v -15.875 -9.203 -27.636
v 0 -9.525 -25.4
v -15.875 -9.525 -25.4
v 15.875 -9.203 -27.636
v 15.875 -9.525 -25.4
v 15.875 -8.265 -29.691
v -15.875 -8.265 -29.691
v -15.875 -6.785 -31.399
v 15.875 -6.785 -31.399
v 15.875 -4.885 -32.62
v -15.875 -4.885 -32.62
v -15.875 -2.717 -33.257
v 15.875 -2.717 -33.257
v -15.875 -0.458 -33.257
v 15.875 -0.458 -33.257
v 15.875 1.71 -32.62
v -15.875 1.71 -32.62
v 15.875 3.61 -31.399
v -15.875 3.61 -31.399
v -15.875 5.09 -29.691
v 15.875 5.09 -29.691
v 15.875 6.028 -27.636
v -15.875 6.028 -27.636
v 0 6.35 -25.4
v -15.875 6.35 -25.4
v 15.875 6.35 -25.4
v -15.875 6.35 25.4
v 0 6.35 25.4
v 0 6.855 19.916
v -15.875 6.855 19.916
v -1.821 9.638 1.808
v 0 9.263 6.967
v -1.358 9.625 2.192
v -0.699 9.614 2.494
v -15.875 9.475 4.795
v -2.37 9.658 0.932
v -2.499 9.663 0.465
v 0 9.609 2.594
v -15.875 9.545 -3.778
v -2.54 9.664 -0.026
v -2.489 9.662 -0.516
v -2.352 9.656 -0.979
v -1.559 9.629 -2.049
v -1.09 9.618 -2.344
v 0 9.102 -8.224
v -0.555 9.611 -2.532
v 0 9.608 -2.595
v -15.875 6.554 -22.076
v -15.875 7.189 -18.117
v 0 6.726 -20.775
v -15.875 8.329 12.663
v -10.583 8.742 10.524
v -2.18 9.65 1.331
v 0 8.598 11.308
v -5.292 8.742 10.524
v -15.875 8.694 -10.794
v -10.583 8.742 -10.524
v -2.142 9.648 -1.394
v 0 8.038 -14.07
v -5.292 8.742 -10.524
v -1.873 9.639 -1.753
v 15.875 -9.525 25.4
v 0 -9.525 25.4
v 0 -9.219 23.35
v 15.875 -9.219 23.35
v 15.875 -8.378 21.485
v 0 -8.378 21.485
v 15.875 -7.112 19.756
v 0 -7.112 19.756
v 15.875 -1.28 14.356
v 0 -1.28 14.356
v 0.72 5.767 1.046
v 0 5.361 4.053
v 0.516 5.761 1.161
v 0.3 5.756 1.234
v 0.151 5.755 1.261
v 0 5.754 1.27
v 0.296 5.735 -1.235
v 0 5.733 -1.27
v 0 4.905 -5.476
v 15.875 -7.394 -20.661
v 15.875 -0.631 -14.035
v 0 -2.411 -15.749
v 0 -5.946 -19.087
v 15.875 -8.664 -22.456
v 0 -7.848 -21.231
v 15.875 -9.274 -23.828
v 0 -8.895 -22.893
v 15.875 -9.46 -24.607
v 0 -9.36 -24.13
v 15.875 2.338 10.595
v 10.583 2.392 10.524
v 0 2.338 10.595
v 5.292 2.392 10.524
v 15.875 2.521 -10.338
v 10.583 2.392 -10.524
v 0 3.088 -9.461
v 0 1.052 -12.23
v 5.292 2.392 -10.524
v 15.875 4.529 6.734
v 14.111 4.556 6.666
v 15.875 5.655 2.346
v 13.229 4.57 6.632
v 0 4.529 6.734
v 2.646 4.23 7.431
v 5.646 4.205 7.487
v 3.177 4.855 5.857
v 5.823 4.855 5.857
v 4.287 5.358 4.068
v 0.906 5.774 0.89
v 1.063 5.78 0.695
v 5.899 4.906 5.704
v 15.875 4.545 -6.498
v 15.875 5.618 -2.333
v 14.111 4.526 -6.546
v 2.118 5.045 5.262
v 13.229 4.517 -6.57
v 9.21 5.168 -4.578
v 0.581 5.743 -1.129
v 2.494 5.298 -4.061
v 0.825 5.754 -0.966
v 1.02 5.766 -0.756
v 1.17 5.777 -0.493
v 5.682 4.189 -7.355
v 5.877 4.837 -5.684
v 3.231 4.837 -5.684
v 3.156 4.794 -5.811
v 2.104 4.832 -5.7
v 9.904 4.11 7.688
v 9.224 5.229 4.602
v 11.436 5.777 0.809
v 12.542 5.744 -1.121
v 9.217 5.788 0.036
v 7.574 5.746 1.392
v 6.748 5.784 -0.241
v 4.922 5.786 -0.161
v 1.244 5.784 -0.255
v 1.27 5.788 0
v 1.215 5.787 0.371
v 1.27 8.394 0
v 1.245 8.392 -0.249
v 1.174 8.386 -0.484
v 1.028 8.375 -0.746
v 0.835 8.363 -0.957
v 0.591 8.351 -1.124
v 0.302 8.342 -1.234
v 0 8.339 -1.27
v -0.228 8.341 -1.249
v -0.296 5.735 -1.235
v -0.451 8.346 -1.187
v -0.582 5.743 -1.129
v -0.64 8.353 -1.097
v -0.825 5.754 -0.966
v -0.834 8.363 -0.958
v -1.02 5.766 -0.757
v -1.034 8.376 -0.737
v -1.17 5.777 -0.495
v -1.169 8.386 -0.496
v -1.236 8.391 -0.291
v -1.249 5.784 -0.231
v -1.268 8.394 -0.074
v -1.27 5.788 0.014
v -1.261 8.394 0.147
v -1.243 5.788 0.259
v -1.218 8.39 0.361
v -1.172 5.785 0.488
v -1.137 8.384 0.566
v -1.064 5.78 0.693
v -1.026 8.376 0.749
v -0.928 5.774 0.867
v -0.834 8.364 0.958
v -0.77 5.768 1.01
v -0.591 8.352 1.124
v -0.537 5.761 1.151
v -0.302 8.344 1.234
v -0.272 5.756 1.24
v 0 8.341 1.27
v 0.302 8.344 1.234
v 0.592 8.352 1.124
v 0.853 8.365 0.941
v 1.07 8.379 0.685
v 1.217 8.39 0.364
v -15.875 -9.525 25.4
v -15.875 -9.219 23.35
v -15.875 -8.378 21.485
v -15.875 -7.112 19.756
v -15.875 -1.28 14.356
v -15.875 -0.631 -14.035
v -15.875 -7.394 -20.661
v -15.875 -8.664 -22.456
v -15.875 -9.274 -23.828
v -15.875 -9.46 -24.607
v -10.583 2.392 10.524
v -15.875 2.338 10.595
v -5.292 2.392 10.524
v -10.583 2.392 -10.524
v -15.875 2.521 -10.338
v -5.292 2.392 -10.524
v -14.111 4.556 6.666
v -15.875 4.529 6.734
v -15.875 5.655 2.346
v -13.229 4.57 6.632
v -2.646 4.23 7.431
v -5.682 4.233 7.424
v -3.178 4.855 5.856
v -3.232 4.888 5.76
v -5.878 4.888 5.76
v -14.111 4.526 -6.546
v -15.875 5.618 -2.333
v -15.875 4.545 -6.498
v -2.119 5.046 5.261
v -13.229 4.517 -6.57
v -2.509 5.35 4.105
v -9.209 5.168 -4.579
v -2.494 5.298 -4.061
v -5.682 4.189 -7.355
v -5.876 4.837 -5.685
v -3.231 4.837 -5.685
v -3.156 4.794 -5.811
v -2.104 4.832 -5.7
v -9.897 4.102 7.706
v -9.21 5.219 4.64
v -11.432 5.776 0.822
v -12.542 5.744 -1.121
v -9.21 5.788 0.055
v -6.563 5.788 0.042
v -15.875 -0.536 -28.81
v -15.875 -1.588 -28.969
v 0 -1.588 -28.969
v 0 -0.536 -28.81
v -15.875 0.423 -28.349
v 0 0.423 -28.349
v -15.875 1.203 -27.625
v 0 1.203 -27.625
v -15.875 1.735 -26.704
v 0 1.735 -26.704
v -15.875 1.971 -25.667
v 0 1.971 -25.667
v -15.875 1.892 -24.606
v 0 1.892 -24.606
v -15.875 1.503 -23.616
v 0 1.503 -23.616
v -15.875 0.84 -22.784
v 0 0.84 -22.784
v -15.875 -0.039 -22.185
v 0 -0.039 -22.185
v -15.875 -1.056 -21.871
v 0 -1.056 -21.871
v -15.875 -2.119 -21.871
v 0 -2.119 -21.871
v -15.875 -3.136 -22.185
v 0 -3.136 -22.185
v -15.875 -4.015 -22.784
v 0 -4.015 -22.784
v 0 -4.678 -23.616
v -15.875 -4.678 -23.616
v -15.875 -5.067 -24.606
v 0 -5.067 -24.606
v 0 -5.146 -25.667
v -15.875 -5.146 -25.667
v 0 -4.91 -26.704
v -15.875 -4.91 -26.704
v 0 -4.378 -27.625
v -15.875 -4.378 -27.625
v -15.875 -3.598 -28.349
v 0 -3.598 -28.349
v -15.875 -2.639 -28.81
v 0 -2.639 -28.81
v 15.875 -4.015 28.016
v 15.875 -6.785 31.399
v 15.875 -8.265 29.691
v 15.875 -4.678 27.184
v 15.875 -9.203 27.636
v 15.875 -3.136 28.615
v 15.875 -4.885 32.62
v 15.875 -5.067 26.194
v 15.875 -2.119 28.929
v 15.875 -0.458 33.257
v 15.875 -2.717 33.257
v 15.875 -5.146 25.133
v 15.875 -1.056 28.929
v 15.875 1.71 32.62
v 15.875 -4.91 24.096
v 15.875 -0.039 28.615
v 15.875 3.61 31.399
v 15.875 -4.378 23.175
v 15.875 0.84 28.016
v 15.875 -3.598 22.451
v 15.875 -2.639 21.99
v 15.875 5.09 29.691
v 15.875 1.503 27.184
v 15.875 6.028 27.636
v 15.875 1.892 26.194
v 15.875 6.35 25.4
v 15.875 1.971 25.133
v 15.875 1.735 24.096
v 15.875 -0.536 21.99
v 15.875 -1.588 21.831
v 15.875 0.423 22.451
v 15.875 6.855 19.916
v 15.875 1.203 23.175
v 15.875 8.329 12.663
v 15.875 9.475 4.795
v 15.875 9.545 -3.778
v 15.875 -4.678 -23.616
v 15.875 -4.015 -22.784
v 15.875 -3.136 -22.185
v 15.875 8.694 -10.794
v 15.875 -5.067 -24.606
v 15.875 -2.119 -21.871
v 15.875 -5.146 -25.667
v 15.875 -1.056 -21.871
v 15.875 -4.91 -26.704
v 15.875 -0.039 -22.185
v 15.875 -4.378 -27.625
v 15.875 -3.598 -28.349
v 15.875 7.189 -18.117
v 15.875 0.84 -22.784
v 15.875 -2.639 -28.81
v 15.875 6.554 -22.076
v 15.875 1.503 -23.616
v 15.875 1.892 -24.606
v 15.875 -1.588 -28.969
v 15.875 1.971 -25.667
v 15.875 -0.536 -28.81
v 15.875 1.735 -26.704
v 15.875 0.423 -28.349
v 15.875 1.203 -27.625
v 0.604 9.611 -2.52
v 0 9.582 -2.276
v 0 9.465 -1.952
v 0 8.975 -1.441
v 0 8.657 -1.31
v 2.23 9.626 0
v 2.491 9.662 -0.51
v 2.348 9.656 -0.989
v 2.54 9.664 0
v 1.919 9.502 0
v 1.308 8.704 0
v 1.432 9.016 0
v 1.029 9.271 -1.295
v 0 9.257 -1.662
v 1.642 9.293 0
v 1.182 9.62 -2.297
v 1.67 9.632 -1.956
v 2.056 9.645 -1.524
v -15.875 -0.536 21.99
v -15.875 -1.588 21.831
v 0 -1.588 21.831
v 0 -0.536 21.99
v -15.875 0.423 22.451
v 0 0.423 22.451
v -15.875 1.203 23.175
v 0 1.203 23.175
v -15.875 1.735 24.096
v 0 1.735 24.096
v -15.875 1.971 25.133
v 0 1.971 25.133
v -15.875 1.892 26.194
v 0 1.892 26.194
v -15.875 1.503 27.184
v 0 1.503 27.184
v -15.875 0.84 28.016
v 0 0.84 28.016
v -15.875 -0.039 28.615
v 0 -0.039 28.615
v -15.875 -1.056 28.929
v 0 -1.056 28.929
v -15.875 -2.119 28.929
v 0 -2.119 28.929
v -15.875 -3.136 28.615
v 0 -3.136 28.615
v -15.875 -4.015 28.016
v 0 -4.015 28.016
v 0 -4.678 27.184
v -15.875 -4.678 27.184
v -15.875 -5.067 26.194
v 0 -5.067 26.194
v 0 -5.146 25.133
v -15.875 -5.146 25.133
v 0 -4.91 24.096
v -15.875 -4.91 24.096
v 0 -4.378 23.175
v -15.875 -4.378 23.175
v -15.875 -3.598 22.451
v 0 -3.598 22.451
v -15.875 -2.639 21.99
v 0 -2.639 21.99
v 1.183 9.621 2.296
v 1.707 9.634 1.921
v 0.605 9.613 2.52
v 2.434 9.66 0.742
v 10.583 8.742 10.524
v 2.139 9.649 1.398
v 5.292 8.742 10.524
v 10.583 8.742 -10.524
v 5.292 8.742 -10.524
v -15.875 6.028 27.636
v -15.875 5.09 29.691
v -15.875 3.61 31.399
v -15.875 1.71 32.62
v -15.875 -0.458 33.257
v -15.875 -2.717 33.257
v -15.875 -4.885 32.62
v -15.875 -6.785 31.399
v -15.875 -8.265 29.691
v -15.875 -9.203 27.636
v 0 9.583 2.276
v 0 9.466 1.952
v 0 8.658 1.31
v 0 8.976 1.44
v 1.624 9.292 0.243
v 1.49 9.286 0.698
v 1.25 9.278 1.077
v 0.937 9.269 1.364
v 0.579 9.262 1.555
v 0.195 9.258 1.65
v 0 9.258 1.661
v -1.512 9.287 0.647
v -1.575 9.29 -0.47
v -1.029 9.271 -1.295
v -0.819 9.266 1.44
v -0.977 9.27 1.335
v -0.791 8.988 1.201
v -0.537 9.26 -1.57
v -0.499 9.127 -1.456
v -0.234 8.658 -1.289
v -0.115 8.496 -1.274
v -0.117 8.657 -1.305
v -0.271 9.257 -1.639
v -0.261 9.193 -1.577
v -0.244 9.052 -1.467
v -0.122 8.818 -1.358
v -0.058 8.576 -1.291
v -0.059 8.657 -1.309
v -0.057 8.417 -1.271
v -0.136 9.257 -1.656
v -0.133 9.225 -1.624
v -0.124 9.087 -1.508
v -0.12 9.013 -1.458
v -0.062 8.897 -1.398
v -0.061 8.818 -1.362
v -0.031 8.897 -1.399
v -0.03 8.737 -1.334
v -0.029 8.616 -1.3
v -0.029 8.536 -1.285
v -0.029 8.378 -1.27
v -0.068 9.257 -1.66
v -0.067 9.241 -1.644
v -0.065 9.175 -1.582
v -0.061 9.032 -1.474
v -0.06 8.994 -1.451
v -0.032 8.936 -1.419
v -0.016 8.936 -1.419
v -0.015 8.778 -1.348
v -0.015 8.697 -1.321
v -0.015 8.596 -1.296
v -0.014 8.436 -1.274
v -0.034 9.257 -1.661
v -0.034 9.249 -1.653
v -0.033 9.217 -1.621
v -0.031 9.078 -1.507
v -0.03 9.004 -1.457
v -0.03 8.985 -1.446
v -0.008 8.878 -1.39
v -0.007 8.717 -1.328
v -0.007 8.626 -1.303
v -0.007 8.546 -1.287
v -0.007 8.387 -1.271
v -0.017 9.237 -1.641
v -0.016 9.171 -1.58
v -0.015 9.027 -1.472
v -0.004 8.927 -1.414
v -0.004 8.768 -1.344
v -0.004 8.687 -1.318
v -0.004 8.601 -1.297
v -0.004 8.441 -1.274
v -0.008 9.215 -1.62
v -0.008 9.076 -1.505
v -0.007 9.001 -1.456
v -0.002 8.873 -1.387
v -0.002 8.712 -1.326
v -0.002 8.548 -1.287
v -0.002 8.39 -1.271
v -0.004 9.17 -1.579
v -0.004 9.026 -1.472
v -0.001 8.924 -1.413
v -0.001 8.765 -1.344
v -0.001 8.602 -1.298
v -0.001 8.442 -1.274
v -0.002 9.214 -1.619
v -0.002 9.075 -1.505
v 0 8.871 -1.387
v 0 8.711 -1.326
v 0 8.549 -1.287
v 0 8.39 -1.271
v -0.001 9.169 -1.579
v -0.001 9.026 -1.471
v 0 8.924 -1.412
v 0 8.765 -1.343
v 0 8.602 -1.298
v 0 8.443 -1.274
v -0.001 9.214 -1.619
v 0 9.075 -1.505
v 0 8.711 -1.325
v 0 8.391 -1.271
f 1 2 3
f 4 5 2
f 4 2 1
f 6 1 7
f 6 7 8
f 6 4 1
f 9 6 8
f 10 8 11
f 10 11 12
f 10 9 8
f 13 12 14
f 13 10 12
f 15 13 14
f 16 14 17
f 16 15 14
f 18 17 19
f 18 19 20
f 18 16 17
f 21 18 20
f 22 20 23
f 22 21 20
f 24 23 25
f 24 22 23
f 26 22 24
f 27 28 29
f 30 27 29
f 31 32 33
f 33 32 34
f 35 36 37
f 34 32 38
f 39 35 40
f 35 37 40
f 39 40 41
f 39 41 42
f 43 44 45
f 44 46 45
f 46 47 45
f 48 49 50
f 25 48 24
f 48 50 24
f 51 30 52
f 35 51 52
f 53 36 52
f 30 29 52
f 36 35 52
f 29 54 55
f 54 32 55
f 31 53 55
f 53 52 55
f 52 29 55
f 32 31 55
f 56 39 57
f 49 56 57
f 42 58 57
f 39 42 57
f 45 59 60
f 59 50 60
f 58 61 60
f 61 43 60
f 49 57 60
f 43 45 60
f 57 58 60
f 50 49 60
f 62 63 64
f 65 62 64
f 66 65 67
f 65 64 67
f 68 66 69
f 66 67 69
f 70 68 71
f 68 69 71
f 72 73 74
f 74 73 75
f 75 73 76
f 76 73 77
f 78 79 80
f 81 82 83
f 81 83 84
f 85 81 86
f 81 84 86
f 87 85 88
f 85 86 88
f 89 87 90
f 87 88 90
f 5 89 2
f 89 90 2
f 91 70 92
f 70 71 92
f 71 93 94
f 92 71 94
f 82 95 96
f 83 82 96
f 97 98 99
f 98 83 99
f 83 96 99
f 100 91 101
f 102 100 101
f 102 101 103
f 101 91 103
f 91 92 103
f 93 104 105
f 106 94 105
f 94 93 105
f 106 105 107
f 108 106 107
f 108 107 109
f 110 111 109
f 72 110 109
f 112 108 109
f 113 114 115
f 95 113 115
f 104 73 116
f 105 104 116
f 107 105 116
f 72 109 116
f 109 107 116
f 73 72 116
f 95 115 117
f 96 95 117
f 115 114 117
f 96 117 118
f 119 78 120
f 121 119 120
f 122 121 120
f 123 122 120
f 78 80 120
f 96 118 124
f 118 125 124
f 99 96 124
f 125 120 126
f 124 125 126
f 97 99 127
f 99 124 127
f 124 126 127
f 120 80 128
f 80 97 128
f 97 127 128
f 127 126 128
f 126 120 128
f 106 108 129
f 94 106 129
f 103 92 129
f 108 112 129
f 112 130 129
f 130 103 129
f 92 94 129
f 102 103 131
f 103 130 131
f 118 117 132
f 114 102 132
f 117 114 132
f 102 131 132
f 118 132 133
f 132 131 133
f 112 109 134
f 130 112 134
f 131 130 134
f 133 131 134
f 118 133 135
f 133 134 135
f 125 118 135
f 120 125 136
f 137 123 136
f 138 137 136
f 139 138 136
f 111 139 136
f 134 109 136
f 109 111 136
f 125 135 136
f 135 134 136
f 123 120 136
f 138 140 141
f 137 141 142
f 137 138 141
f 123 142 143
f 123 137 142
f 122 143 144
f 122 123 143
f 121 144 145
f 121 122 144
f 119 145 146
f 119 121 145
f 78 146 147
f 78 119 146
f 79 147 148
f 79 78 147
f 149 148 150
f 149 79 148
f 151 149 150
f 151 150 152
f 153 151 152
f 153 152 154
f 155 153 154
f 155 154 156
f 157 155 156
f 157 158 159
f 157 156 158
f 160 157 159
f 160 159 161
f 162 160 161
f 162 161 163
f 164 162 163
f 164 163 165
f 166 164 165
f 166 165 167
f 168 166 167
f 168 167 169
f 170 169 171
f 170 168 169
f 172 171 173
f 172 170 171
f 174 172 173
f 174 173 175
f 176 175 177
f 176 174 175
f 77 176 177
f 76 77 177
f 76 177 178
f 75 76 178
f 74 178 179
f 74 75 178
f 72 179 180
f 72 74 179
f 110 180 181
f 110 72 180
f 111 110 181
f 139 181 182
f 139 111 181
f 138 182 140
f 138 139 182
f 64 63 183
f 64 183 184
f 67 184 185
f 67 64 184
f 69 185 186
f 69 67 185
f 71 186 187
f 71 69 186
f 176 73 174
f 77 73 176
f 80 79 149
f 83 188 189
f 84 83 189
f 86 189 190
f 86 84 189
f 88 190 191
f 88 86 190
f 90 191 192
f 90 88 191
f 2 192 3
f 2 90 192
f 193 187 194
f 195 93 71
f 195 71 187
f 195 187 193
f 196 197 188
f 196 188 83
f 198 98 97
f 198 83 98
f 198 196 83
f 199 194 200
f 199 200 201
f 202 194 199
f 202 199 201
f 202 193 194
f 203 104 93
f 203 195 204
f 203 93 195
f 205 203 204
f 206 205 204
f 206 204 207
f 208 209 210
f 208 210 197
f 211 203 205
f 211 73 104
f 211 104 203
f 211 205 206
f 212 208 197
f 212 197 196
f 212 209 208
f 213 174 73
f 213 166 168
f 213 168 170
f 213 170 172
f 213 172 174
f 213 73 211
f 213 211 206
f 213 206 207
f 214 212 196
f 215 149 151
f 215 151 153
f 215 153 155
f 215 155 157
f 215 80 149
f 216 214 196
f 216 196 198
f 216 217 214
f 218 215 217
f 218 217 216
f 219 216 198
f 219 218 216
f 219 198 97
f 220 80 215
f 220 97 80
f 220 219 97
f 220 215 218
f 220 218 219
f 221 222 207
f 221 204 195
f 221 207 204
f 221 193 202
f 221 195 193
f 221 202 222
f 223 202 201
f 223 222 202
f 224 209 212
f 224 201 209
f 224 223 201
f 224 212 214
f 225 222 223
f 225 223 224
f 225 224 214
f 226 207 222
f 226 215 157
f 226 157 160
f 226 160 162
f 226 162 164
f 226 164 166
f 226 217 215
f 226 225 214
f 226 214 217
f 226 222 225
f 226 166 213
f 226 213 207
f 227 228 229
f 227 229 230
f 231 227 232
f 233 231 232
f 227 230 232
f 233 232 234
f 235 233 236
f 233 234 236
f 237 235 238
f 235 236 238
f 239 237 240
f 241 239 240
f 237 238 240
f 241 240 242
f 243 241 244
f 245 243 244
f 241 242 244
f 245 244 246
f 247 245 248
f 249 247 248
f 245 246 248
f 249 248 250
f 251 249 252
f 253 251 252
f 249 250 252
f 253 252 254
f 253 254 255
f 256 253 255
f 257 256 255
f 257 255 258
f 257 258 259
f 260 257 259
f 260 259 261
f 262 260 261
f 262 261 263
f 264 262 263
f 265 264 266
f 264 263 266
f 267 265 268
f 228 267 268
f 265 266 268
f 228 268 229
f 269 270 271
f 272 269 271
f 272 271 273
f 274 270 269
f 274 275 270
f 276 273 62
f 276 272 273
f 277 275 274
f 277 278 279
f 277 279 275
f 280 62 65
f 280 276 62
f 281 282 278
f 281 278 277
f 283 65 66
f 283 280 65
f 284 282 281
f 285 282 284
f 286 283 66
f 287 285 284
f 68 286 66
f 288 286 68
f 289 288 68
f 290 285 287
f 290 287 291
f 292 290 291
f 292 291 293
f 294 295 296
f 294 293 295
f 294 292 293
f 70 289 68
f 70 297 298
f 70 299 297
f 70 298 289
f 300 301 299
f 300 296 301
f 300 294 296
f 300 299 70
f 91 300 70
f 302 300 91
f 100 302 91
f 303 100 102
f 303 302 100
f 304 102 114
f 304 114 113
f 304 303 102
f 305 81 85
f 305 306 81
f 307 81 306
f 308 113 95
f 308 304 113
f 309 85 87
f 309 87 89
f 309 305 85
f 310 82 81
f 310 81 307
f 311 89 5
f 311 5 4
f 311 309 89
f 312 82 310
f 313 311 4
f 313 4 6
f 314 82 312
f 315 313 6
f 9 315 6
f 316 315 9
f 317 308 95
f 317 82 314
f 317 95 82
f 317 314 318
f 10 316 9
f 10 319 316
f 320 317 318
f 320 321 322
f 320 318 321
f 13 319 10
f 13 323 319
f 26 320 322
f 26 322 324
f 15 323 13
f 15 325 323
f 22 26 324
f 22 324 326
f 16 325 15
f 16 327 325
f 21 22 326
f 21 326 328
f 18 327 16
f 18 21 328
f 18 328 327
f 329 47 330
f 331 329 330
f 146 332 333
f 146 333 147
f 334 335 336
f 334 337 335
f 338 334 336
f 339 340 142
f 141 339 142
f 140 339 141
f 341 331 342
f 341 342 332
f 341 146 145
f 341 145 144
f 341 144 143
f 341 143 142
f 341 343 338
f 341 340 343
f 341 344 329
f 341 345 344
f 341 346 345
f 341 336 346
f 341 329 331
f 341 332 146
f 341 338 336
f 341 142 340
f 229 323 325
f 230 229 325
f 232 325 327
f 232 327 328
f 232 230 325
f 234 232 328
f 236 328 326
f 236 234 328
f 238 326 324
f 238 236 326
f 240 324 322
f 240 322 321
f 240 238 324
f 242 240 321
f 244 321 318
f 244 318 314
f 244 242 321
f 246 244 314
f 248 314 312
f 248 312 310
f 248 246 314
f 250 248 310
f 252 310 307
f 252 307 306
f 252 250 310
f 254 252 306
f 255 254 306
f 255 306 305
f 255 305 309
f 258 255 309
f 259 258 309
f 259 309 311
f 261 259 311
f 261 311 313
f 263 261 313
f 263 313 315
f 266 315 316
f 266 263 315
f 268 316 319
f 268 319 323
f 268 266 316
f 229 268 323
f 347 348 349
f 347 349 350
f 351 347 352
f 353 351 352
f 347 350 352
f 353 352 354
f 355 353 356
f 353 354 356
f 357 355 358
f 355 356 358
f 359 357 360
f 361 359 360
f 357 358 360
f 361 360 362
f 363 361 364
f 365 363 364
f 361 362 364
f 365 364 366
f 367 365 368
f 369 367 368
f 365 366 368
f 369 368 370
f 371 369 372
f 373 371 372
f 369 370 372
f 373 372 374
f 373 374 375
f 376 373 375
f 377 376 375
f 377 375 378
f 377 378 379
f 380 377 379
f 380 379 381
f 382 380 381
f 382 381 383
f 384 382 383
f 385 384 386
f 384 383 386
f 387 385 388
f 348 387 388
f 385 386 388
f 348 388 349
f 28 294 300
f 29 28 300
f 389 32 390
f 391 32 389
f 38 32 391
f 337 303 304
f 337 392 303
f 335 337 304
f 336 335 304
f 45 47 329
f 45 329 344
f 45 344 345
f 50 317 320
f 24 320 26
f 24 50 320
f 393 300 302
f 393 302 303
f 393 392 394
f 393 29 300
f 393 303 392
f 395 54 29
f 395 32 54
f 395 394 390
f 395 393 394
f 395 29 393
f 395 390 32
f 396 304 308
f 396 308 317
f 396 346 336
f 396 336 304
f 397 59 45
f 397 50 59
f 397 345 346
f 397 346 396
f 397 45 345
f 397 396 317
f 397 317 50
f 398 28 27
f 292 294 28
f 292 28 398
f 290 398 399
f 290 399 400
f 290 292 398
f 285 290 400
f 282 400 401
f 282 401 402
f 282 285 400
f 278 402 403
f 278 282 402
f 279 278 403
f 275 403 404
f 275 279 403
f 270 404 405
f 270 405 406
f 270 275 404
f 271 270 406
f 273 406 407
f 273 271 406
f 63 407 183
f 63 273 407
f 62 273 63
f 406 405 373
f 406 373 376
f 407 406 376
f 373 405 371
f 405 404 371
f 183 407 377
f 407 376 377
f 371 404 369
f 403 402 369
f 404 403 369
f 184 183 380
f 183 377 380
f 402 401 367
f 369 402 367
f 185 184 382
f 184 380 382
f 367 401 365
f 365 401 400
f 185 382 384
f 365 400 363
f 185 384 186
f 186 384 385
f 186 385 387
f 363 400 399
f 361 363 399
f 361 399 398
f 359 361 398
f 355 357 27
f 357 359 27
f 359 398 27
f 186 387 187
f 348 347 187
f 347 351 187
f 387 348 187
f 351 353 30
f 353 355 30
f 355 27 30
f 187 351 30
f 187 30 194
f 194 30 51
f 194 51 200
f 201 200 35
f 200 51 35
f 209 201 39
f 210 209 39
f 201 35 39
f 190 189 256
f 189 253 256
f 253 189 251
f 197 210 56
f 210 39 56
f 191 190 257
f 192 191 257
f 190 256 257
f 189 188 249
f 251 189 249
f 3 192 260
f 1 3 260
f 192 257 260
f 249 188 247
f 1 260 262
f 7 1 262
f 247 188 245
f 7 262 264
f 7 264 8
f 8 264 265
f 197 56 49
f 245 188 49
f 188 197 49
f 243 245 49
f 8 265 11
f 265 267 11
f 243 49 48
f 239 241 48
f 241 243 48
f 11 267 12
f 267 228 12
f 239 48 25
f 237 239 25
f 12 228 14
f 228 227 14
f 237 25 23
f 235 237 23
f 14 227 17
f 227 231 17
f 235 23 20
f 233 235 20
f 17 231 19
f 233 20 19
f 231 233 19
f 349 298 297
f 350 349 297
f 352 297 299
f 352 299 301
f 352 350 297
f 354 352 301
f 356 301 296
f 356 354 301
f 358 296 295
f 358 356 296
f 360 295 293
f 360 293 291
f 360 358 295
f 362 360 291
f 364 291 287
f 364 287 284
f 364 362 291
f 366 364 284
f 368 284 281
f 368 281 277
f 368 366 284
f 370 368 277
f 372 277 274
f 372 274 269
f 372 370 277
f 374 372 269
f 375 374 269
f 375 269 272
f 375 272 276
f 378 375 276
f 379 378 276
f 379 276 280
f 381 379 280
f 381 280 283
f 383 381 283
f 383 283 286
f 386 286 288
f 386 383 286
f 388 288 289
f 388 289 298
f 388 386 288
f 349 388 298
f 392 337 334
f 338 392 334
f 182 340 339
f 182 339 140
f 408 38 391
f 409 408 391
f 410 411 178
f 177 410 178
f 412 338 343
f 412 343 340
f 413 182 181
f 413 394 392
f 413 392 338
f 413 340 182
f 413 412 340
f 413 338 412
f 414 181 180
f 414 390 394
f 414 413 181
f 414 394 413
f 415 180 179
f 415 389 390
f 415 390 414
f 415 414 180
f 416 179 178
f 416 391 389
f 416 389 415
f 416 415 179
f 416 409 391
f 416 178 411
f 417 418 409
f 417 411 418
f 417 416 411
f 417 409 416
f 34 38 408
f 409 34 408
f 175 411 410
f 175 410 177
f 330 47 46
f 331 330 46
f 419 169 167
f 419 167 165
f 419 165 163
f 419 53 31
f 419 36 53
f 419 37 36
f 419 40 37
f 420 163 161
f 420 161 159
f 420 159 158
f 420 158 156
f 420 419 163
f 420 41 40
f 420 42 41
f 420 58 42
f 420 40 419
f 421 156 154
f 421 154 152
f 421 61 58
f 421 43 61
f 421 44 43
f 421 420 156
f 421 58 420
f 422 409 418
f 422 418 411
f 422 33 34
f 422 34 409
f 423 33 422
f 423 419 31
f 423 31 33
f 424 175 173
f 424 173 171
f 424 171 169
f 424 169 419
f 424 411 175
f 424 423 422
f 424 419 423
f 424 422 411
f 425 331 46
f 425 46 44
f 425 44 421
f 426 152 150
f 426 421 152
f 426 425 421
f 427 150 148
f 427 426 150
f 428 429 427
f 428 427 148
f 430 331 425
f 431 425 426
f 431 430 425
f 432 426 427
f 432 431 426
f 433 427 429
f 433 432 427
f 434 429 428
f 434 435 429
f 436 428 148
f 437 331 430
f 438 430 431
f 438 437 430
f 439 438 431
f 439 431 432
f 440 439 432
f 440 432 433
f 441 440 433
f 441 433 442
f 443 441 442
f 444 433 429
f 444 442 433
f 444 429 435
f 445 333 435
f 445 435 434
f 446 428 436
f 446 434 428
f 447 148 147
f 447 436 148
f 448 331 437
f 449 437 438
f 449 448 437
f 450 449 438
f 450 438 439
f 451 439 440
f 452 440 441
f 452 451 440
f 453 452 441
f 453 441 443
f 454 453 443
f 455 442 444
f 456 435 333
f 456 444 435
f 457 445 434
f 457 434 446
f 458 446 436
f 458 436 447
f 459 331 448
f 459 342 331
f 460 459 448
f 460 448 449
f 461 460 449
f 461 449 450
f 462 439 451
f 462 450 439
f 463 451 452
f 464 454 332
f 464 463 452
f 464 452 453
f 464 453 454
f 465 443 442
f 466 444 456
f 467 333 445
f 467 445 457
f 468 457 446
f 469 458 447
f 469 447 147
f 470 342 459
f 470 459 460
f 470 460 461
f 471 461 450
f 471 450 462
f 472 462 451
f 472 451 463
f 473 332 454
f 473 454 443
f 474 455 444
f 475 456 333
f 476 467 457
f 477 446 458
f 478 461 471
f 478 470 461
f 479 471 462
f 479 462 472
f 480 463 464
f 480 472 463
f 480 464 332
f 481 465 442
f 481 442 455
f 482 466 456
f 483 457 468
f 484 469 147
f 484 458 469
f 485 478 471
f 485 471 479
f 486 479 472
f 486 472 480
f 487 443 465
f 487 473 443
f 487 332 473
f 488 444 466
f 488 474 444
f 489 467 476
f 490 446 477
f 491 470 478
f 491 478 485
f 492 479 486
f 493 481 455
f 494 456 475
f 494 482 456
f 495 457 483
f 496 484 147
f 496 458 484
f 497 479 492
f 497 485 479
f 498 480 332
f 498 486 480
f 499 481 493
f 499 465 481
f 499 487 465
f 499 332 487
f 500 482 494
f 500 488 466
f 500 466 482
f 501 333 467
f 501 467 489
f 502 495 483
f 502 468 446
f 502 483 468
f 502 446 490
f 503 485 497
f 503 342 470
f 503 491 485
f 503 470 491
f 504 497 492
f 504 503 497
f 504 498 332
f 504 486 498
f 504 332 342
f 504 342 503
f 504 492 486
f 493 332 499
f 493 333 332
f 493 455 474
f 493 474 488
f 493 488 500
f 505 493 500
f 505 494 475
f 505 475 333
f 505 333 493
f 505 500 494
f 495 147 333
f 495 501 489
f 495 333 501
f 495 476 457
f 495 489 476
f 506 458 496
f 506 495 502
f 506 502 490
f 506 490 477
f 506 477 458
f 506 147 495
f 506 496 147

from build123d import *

# Parameters (mm, degrees)
SKETCH1_R               = 3.5687
BOSS_EXTRUDE1_DEPTH     = 15.875
SKETCH3_R               = 1.27
CUT_EXTRUDE1_DEPTH      = 10.664482261
CUT_EXTRUDE1_DEPTH_BACK = 10.5250001
FILLET1_R               = 1.27


with BuildPart() as part:
    # Sketch1 → Boss-Extrude1 (new body, symmetric)
    with BuildSketch(Plane(origin=(0, 0, 0), x_dir=(0, 0, -1), z_dir=(1, 0, 0))):
        with BuildLine():
            ThreePointArc((-25.4, 6.35), (-33.3375, -1.5875), (-25.4, -9.525))
            add(Edge.make_bspline(
                [(-25.4, -9.525), (-19.285597161, -9.525), (-12.305997333, 6.920563629), (11.89065455, 6.920563629), (20.378521675, -9.525), (25.4, -9.525)],
                knots=[0, 0, 0, 0, 0.322142276, 0.677857724, 1, 1, 1, 1], degree=3))
            ThreePointArc((25.4, -9.525), (33.3375, -1.5875), (25.4, 6.35))
            add(Edge.make_bspline(
                [(-25.4, 6.35), (-20.376566451, 6.35), (-8.675332264, 9.972034061), (8.633848157, 9.972034061), (20.457221768, 6.35), (25.4, 6.35)],
                knots=[0, 0, 0, 0, 0.294387704, 0.705612296, 1, 1, 1, 1], degree=3))
        make_face()
        with Locations((-25.4, -1.5875)):
            Circle(SKETCH1_R, mode=Mode.SUBTRACT)
        with Locations((25.4, -1.5875)):
            Circle(SKETCH1_R, mode=Mode.SUBTRACT)
    extrude(amount=BOSS_EXTRUDE1_DEPTH, both=True)

    # Sketch3 → Cut-Extrude1 (cut, two sides)
    with BuildSketch(Plane(origin=(0, 0, 0), x_dir=(1, 0, 0), z_dir=(0, 1, 0))) as cut_extrude1_sk:
        Circle(SKETCH3_R)
    extrude(amount=CUT_EXTRUDE1_DEPTH, mode=Mode.SUBTRACT)
    extrude(cut_extrude1_sk.sketch, amount=-CUT_EXTRUDE1_DEPTH_BACK, mode=Mode.SUBTRACT)

    # Fillet1
    fillet1_edges = [part.edges().sort_by_distance(p)[0] for p in [
        (0.898025647, 9.657580455, -0.898025583),
    ]]
    fillet(fillet1_edges, radius=FILLET1_R)


solid = part.part
